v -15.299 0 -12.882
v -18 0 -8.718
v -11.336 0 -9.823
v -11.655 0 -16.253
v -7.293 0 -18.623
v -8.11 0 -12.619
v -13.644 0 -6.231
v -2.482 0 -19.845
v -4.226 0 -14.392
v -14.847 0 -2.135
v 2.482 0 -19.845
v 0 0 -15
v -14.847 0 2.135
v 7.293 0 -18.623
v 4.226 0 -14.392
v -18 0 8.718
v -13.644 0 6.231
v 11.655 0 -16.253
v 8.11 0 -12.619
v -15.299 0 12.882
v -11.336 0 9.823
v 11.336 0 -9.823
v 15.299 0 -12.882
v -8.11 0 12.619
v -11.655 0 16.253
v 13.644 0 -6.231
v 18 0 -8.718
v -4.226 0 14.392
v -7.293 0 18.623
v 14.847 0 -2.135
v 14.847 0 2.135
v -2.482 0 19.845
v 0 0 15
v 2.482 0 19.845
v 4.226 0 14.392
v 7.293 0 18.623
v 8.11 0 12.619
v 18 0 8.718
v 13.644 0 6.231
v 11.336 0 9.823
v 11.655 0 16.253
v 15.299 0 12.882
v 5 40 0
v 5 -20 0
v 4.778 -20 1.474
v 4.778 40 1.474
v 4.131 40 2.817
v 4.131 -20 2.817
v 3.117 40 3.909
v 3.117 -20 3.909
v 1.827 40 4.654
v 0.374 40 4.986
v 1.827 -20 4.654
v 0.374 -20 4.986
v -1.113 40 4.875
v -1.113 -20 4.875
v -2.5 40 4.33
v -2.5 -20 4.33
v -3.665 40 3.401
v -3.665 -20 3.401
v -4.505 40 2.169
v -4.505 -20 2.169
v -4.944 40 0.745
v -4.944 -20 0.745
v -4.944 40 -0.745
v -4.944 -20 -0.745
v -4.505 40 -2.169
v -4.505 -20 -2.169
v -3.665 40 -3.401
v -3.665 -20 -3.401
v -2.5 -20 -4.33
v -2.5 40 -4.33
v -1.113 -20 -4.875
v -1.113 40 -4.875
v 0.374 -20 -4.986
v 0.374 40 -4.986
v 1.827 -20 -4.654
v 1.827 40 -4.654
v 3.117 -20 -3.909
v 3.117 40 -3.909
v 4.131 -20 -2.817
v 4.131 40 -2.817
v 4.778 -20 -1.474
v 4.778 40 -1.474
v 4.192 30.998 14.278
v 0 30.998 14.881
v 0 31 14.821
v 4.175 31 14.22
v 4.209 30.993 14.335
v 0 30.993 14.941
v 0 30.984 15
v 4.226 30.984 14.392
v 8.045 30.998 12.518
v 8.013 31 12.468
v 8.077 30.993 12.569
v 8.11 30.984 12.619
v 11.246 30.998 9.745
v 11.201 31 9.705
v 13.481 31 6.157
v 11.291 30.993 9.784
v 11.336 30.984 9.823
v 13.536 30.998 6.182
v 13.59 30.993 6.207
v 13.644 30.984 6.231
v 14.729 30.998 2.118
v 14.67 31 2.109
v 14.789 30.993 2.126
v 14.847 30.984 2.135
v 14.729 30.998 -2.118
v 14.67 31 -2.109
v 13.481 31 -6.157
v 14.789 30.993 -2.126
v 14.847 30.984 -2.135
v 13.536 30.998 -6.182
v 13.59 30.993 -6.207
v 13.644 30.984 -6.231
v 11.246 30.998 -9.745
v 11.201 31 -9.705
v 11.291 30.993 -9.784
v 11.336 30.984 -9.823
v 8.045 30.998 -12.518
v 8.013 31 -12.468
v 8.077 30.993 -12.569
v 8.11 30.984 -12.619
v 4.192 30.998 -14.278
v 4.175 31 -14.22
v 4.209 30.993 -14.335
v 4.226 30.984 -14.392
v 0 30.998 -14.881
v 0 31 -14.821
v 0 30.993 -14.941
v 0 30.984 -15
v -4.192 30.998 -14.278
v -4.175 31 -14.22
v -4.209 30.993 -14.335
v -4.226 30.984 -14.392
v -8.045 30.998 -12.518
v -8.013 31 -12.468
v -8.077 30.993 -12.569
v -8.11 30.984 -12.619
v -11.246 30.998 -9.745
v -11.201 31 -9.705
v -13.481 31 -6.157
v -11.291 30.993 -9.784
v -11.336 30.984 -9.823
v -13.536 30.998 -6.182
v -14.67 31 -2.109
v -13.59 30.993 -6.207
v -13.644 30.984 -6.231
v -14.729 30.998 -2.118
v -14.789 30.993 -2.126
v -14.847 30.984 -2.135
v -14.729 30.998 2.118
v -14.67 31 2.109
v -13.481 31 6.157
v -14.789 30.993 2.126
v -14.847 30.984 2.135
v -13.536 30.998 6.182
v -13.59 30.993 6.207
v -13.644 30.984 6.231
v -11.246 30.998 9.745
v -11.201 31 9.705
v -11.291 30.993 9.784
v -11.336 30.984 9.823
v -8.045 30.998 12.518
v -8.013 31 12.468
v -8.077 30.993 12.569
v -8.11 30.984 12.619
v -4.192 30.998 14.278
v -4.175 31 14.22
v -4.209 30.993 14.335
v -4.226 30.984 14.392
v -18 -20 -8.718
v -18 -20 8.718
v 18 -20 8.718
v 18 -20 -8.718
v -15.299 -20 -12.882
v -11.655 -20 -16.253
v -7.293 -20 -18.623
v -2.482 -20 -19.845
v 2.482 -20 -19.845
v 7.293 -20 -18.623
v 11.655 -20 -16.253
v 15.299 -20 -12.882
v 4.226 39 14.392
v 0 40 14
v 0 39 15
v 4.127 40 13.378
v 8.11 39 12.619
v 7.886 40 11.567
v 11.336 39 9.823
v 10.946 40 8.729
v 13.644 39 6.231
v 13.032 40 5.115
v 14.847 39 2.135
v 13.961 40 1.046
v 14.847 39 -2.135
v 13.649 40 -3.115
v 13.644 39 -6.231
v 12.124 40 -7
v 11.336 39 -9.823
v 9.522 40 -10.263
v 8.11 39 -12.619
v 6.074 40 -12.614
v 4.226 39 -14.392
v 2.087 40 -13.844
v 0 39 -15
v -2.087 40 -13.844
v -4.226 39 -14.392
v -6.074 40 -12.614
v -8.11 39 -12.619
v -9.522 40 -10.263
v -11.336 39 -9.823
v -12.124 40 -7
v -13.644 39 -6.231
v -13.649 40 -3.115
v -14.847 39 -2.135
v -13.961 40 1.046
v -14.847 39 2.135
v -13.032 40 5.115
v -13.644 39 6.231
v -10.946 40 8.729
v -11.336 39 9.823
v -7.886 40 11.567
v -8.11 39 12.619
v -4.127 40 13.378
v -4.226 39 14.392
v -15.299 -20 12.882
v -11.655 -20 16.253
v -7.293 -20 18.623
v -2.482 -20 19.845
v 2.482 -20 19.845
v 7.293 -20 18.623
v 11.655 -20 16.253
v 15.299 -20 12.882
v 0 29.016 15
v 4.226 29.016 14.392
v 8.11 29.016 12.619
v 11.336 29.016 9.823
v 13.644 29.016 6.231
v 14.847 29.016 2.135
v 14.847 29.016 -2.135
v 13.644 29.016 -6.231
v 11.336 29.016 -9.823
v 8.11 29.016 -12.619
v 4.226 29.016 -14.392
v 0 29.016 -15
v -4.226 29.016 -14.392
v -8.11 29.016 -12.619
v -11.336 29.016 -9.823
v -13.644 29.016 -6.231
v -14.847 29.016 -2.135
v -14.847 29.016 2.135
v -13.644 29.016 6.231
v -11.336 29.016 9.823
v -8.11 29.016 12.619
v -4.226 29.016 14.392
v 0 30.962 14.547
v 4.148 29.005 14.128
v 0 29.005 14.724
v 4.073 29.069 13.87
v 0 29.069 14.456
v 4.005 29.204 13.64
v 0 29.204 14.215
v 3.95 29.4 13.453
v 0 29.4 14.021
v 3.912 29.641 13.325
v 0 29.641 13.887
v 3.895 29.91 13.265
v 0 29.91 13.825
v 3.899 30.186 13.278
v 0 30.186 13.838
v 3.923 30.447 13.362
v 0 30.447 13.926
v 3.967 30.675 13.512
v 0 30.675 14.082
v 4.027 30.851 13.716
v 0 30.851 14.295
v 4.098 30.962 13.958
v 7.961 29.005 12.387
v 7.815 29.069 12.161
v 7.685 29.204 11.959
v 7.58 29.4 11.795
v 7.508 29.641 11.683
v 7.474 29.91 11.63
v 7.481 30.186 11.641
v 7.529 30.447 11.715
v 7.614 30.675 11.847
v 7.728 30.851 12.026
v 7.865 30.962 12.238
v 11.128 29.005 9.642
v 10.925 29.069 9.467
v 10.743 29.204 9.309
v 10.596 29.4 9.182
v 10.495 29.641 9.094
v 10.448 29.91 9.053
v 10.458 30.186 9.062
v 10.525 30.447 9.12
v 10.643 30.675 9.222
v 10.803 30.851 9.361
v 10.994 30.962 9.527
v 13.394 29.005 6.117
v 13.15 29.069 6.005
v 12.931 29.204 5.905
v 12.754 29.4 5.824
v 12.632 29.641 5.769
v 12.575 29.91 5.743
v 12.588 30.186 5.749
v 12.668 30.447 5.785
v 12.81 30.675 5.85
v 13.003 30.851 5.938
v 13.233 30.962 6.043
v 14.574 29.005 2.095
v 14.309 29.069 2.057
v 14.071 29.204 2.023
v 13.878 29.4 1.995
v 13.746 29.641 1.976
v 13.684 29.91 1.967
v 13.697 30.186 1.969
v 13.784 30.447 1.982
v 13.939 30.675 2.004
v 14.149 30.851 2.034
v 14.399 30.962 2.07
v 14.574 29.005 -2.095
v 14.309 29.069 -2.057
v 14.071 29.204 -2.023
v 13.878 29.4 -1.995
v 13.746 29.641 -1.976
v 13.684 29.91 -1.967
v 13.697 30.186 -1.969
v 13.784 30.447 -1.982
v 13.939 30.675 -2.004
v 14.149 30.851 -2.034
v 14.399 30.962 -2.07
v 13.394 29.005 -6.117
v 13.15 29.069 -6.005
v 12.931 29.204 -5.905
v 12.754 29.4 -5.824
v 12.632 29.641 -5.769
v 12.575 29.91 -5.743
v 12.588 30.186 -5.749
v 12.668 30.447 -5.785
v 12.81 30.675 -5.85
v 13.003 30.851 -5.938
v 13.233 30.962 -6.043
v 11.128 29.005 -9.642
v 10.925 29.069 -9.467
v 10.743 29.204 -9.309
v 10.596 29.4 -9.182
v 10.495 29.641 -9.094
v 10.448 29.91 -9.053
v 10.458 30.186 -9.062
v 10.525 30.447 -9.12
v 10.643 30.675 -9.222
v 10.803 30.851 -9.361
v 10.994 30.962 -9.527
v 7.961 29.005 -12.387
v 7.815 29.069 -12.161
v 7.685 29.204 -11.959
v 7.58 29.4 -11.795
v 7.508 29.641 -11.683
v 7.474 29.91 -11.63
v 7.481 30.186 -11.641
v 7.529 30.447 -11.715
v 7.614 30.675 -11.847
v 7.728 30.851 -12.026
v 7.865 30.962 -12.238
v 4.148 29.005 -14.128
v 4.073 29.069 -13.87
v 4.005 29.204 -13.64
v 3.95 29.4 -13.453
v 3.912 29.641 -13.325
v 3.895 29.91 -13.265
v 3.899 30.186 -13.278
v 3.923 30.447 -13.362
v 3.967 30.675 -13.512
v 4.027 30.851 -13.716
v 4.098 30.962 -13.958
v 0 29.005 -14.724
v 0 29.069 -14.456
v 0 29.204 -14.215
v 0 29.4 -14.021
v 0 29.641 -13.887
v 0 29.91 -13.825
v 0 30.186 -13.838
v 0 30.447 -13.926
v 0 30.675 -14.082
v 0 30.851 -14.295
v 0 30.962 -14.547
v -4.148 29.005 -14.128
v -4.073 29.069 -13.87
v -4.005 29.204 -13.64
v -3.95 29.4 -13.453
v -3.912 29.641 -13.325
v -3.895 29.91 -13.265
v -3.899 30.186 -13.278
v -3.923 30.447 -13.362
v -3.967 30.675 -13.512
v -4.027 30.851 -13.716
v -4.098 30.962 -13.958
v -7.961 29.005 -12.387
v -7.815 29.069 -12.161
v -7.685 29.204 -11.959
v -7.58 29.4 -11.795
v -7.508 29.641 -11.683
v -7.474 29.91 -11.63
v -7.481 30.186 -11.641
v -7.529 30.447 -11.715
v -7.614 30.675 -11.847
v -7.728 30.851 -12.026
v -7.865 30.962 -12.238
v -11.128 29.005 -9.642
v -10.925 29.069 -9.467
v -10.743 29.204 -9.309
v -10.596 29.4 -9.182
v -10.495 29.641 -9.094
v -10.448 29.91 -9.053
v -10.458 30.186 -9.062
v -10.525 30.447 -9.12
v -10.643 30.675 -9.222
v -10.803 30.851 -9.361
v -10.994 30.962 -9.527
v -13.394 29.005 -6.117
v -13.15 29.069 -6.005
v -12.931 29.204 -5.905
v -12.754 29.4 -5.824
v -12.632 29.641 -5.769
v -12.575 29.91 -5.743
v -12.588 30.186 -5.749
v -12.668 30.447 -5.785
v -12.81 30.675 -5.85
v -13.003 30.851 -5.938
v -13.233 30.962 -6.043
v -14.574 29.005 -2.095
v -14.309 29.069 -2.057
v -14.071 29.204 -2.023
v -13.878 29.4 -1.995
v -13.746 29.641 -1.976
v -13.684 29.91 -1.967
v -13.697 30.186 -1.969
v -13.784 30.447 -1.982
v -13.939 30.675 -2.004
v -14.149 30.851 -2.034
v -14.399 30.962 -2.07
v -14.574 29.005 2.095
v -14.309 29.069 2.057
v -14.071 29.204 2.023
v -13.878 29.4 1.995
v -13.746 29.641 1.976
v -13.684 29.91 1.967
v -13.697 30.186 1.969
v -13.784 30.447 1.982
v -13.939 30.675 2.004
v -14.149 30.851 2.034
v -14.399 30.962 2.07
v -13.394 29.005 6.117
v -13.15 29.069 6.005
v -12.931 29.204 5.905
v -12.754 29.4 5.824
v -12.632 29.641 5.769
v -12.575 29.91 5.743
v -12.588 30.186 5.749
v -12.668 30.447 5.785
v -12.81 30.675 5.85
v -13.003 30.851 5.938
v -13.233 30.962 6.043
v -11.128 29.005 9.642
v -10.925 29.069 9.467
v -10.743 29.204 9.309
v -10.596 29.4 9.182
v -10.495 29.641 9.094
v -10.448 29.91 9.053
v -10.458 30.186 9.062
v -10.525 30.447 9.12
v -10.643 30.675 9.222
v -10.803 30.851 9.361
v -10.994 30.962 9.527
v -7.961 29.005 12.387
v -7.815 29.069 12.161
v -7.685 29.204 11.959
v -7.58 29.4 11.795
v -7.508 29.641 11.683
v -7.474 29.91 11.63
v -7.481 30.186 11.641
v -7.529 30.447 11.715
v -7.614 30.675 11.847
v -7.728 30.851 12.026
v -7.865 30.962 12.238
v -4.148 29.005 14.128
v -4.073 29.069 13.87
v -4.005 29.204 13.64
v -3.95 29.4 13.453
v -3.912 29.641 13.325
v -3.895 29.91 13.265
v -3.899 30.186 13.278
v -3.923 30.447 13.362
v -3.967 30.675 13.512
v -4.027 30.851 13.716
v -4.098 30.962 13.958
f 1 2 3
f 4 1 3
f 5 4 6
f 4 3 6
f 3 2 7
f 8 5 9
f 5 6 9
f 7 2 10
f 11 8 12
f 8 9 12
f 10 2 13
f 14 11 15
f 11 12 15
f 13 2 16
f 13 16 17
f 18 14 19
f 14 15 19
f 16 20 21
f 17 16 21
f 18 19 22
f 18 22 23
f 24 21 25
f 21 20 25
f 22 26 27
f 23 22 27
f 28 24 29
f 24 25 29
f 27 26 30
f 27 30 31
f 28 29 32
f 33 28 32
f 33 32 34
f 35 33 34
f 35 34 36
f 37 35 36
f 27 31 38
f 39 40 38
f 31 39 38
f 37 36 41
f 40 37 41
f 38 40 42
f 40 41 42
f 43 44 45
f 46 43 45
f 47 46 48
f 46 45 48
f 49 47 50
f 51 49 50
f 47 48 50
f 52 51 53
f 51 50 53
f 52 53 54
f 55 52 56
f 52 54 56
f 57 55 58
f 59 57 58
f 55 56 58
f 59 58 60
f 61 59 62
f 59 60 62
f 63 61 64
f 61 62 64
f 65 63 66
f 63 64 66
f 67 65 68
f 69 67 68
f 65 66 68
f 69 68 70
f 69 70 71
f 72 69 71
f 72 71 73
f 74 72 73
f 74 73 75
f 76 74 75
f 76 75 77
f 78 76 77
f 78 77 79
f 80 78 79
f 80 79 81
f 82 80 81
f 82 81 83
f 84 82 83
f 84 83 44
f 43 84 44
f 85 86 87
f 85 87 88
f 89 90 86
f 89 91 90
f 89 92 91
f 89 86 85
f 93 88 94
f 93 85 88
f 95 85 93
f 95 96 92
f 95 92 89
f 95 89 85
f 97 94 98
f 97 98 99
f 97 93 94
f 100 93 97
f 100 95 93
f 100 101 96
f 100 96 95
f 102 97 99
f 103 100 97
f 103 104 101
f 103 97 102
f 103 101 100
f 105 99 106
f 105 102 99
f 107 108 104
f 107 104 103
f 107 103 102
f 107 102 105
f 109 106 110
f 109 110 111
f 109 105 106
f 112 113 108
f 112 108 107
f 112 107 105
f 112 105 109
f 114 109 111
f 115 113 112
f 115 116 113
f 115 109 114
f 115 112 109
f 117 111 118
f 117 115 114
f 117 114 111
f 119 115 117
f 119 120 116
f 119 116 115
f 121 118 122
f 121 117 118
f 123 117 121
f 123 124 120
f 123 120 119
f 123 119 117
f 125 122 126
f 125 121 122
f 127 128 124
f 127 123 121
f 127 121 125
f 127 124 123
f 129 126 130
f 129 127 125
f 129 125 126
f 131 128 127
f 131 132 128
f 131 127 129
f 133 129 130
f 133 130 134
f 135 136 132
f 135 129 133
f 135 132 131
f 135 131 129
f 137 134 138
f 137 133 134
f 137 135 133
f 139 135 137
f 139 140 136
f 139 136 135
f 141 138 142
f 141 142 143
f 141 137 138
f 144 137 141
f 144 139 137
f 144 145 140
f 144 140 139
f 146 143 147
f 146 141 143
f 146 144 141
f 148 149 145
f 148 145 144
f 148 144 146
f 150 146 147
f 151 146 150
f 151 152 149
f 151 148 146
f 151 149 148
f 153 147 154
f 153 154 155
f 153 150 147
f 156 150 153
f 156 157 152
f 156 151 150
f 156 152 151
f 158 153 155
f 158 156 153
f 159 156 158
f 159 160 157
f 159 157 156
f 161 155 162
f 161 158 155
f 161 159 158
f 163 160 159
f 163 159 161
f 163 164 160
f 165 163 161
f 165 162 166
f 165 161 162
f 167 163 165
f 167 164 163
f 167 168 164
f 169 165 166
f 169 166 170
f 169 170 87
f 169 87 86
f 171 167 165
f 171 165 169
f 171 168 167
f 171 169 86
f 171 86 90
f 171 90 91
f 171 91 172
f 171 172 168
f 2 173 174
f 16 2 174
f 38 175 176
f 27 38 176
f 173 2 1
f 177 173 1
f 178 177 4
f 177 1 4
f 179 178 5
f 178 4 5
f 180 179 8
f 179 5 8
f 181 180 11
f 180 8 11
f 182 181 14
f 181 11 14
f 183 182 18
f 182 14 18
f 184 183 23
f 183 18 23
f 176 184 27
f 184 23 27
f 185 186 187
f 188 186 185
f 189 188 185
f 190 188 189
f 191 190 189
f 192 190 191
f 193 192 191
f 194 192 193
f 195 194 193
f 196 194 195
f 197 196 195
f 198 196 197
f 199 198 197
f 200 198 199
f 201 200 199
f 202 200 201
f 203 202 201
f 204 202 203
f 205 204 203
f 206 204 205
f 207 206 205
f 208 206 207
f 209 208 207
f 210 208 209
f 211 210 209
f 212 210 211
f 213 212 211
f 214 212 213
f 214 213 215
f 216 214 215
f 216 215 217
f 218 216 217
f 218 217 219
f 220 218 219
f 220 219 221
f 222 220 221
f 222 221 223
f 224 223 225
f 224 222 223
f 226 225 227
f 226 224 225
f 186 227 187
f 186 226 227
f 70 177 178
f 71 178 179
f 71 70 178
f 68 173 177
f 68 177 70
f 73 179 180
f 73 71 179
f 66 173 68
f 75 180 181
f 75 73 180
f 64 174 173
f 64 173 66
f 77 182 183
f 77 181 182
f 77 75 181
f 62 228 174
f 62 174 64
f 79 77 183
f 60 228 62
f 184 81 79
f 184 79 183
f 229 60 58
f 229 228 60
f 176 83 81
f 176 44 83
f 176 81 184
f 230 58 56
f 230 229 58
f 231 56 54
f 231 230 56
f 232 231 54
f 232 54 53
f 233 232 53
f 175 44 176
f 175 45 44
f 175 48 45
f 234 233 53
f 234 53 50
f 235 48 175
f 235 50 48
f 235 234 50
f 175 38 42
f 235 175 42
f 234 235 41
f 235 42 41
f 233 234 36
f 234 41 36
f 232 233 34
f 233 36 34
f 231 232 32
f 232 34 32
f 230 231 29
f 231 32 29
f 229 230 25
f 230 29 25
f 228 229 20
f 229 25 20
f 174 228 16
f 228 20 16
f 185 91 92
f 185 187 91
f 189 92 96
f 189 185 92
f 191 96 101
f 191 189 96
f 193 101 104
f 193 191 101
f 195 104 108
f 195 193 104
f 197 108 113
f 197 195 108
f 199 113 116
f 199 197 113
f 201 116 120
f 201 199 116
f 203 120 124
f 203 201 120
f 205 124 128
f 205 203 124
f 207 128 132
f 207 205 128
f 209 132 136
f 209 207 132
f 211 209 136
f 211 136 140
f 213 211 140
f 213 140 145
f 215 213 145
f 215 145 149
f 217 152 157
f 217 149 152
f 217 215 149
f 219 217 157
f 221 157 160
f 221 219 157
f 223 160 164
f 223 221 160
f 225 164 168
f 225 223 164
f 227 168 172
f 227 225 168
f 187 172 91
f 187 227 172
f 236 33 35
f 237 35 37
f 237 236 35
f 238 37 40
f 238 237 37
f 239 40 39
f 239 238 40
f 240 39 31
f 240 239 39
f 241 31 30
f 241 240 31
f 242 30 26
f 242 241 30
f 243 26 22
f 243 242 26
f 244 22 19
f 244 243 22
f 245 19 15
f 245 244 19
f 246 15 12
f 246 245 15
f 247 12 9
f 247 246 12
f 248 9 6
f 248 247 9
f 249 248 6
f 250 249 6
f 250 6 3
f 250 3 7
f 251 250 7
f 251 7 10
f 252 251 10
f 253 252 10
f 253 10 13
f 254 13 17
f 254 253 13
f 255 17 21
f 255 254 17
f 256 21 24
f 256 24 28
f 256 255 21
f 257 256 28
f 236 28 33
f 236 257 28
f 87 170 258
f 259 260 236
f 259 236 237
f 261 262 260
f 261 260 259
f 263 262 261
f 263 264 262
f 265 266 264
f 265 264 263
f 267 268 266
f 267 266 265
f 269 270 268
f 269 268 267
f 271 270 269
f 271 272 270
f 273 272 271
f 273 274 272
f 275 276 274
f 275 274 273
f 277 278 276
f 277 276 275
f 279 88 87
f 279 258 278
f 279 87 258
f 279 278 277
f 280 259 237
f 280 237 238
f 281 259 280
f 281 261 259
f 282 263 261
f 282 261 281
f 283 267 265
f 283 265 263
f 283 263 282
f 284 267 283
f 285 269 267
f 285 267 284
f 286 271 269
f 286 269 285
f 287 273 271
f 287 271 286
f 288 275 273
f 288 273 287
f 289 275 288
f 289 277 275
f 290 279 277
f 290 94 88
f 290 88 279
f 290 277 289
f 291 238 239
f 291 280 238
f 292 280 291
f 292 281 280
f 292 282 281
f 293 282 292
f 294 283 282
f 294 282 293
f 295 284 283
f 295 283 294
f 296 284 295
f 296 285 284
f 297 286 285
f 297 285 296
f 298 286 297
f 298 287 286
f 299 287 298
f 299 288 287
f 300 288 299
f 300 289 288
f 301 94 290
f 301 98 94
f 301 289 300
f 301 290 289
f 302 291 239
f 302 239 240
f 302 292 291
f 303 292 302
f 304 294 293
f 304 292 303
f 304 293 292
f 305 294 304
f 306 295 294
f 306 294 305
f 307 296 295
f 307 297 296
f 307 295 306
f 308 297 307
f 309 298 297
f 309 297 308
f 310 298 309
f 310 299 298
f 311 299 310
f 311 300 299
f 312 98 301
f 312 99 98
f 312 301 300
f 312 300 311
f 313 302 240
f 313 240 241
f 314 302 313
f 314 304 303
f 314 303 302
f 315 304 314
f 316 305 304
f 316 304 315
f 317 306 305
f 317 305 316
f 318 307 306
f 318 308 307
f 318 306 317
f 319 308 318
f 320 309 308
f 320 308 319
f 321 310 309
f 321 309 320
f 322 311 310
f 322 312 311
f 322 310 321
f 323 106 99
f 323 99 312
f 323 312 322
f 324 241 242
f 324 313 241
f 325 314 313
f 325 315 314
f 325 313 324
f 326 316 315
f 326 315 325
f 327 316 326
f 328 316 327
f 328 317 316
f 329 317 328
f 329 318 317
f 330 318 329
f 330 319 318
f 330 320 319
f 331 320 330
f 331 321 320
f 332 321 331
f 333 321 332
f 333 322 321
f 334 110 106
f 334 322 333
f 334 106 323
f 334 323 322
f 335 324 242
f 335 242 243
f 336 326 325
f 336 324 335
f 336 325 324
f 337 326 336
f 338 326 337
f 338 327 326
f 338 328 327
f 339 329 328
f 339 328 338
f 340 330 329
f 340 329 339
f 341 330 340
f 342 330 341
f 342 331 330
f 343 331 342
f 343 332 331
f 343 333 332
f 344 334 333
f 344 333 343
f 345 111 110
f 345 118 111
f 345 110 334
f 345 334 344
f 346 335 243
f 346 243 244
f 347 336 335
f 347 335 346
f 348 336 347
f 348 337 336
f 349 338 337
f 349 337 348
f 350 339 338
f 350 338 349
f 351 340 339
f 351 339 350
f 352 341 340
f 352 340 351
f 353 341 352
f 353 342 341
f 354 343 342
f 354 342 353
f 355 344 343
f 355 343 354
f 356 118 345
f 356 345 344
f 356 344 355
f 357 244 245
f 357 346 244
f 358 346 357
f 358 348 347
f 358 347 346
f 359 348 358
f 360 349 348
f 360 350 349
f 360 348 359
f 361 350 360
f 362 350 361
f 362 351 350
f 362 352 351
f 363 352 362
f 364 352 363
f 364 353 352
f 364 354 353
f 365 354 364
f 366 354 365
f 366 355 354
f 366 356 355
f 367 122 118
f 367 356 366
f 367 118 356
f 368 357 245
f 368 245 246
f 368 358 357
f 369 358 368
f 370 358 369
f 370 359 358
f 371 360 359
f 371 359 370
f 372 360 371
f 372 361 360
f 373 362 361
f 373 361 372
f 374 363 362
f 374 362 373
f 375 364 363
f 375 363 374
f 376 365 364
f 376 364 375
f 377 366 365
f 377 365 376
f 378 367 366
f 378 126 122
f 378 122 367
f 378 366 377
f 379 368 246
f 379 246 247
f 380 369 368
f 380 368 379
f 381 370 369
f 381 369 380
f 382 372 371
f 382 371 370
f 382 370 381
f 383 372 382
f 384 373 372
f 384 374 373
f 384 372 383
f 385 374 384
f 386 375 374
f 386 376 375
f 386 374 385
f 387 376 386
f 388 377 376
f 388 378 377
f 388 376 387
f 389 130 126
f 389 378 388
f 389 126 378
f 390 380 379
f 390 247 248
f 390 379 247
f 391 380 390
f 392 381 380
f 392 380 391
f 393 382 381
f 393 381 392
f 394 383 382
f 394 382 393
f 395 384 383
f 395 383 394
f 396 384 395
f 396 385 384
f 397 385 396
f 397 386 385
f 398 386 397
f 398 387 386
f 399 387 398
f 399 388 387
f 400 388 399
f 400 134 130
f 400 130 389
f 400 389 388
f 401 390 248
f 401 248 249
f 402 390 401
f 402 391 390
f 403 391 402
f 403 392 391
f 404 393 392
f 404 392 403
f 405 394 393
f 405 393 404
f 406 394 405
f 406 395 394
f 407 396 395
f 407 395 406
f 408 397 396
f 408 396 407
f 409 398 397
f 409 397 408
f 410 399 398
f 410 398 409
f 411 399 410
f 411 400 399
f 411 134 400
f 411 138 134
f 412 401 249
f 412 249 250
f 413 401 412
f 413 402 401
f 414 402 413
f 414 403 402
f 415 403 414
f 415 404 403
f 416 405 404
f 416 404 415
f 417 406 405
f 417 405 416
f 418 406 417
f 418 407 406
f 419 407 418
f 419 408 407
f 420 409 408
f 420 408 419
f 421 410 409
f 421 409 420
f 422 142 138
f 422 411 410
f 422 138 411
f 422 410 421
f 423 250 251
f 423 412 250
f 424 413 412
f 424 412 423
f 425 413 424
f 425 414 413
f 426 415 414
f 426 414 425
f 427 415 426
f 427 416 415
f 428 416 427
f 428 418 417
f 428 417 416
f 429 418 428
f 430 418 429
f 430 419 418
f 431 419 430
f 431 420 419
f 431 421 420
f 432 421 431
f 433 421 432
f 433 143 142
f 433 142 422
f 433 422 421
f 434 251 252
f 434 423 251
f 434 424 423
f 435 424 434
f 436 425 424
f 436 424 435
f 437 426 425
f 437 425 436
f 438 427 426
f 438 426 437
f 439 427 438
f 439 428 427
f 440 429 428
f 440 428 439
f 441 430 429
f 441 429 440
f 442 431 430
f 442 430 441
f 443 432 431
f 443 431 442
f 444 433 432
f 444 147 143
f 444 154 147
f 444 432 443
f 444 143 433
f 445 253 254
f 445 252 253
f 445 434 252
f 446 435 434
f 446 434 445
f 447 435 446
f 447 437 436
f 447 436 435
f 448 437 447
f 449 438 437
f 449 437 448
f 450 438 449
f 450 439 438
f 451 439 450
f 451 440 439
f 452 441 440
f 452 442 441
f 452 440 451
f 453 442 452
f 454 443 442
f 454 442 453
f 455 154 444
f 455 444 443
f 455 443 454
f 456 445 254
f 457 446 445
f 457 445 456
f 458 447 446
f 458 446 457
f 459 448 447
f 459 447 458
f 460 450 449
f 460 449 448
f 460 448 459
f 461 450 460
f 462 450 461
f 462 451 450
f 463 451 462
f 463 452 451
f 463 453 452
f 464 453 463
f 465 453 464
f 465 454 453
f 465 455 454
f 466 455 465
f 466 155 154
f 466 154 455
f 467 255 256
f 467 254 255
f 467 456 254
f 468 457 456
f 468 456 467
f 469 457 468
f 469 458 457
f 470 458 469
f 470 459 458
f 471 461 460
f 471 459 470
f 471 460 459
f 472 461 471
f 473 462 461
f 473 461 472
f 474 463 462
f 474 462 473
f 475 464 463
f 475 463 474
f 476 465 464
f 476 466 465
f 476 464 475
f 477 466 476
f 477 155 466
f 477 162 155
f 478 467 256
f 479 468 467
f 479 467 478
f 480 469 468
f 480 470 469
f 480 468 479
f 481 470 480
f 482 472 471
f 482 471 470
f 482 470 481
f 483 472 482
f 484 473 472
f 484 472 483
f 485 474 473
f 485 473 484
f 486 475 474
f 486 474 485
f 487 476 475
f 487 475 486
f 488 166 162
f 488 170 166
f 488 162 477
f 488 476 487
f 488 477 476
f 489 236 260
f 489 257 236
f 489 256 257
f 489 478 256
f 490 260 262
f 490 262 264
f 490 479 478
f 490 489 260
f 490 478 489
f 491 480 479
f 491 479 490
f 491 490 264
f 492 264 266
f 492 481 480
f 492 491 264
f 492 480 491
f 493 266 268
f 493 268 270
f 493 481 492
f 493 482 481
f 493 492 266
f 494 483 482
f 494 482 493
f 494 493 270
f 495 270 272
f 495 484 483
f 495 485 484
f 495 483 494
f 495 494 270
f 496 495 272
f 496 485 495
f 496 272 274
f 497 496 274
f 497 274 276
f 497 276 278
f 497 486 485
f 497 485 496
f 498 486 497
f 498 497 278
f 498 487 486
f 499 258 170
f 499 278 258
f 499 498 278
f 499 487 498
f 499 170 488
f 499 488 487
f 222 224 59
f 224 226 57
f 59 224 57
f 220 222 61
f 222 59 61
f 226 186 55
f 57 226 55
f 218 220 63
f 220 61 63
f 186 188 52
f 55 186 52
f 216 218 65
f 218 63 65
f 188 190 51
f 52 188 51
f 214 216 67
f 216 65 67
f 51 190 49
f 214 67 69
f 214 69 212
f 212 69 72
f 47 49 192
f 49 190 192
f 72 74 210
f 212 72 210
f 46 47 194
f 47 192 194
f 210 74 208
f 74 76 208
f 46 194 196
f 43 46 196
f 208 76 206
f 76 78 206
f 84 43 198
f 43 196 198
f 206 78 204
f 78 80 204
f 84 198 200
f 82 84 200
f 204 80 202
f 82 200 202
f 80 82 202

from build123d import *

# Parameters (mm, degrees)
F0_R      = 20
F2_DEPTH  = 20
F4_DEPTH  = 20.001
F6_DEPTH  = 20.001
F8_W      = 40
F8_H      = 15
F12_SIZE  = 1
F7_R      = 5
F13_DEPTH = 60.001
F10_R     = 1


with BuildPart() as f2:
    # F0 (on Front) → F2 (new body)
    with BuildSketch(Plane.XZ):
        Circle(F0_R)
    extrude(amount=F2_DEPTH)

    # F3 (on face) → F4 (cut, through all)
    with BuildSketch(Plane.XZ.offset(20)):
        with BuildLine():
            Line((-18, -8.717798), (-18, 8.717798))
            ThreePointArc((-18, 8.717798), (-20, 0), (-18, -8.717798))
        make_face()
    extrude(amount=-F4_DEPTH, mode=Mode.SUBTRACT)

    # F5 (on face) → F6 (cut, through all)
    with BuildSketch(Plane.XZ.offset(20)):
        with BuildLine():
            ThreePointArc((18, -8.717798), (20, 0), (18, 8.717798))
            Line((18, 8.717798), (18, -8.717798))
        make_face()
    extrude(amount=-F6_DEPTH, mode=Mode.SUBTRACT)

    # F8 (on Right) → F11 (revolve)
    with BuildSketch(Plane.YZ):
        with Locations((20, 7.5)):
            Rectangle(F8_W, F8_H)
    revolve(axis=Axis((0, 20, 0), (0, 1, 0)))

    # F12
    f12_edges = [f2.edges().sort_by_distance(p)[0] for p in [
        (0, 40, -15),
    ]]
    chamfer(f12_edges, length=F12_SIZE)

    # F7 (on face) → F13 (cut, through all)
    with BuildSketch(Plane.XZ.offset(20)):
        Circle(F7_R)
    extrude(amount=-F13_DEPTH, mode=Mode.SUBTRACT)

    # F10 (on face) → F14 (revolve, cut)
    with BuildSketch(Plane.YZ):
        with Locations((30, 14.820702)):
            Circle(F10_R)
    revolve(axis=Axis((0, 4.966939, 0), (0, 1, 0)), mode=Mode.SUBTRACT)


solid = f2.part
